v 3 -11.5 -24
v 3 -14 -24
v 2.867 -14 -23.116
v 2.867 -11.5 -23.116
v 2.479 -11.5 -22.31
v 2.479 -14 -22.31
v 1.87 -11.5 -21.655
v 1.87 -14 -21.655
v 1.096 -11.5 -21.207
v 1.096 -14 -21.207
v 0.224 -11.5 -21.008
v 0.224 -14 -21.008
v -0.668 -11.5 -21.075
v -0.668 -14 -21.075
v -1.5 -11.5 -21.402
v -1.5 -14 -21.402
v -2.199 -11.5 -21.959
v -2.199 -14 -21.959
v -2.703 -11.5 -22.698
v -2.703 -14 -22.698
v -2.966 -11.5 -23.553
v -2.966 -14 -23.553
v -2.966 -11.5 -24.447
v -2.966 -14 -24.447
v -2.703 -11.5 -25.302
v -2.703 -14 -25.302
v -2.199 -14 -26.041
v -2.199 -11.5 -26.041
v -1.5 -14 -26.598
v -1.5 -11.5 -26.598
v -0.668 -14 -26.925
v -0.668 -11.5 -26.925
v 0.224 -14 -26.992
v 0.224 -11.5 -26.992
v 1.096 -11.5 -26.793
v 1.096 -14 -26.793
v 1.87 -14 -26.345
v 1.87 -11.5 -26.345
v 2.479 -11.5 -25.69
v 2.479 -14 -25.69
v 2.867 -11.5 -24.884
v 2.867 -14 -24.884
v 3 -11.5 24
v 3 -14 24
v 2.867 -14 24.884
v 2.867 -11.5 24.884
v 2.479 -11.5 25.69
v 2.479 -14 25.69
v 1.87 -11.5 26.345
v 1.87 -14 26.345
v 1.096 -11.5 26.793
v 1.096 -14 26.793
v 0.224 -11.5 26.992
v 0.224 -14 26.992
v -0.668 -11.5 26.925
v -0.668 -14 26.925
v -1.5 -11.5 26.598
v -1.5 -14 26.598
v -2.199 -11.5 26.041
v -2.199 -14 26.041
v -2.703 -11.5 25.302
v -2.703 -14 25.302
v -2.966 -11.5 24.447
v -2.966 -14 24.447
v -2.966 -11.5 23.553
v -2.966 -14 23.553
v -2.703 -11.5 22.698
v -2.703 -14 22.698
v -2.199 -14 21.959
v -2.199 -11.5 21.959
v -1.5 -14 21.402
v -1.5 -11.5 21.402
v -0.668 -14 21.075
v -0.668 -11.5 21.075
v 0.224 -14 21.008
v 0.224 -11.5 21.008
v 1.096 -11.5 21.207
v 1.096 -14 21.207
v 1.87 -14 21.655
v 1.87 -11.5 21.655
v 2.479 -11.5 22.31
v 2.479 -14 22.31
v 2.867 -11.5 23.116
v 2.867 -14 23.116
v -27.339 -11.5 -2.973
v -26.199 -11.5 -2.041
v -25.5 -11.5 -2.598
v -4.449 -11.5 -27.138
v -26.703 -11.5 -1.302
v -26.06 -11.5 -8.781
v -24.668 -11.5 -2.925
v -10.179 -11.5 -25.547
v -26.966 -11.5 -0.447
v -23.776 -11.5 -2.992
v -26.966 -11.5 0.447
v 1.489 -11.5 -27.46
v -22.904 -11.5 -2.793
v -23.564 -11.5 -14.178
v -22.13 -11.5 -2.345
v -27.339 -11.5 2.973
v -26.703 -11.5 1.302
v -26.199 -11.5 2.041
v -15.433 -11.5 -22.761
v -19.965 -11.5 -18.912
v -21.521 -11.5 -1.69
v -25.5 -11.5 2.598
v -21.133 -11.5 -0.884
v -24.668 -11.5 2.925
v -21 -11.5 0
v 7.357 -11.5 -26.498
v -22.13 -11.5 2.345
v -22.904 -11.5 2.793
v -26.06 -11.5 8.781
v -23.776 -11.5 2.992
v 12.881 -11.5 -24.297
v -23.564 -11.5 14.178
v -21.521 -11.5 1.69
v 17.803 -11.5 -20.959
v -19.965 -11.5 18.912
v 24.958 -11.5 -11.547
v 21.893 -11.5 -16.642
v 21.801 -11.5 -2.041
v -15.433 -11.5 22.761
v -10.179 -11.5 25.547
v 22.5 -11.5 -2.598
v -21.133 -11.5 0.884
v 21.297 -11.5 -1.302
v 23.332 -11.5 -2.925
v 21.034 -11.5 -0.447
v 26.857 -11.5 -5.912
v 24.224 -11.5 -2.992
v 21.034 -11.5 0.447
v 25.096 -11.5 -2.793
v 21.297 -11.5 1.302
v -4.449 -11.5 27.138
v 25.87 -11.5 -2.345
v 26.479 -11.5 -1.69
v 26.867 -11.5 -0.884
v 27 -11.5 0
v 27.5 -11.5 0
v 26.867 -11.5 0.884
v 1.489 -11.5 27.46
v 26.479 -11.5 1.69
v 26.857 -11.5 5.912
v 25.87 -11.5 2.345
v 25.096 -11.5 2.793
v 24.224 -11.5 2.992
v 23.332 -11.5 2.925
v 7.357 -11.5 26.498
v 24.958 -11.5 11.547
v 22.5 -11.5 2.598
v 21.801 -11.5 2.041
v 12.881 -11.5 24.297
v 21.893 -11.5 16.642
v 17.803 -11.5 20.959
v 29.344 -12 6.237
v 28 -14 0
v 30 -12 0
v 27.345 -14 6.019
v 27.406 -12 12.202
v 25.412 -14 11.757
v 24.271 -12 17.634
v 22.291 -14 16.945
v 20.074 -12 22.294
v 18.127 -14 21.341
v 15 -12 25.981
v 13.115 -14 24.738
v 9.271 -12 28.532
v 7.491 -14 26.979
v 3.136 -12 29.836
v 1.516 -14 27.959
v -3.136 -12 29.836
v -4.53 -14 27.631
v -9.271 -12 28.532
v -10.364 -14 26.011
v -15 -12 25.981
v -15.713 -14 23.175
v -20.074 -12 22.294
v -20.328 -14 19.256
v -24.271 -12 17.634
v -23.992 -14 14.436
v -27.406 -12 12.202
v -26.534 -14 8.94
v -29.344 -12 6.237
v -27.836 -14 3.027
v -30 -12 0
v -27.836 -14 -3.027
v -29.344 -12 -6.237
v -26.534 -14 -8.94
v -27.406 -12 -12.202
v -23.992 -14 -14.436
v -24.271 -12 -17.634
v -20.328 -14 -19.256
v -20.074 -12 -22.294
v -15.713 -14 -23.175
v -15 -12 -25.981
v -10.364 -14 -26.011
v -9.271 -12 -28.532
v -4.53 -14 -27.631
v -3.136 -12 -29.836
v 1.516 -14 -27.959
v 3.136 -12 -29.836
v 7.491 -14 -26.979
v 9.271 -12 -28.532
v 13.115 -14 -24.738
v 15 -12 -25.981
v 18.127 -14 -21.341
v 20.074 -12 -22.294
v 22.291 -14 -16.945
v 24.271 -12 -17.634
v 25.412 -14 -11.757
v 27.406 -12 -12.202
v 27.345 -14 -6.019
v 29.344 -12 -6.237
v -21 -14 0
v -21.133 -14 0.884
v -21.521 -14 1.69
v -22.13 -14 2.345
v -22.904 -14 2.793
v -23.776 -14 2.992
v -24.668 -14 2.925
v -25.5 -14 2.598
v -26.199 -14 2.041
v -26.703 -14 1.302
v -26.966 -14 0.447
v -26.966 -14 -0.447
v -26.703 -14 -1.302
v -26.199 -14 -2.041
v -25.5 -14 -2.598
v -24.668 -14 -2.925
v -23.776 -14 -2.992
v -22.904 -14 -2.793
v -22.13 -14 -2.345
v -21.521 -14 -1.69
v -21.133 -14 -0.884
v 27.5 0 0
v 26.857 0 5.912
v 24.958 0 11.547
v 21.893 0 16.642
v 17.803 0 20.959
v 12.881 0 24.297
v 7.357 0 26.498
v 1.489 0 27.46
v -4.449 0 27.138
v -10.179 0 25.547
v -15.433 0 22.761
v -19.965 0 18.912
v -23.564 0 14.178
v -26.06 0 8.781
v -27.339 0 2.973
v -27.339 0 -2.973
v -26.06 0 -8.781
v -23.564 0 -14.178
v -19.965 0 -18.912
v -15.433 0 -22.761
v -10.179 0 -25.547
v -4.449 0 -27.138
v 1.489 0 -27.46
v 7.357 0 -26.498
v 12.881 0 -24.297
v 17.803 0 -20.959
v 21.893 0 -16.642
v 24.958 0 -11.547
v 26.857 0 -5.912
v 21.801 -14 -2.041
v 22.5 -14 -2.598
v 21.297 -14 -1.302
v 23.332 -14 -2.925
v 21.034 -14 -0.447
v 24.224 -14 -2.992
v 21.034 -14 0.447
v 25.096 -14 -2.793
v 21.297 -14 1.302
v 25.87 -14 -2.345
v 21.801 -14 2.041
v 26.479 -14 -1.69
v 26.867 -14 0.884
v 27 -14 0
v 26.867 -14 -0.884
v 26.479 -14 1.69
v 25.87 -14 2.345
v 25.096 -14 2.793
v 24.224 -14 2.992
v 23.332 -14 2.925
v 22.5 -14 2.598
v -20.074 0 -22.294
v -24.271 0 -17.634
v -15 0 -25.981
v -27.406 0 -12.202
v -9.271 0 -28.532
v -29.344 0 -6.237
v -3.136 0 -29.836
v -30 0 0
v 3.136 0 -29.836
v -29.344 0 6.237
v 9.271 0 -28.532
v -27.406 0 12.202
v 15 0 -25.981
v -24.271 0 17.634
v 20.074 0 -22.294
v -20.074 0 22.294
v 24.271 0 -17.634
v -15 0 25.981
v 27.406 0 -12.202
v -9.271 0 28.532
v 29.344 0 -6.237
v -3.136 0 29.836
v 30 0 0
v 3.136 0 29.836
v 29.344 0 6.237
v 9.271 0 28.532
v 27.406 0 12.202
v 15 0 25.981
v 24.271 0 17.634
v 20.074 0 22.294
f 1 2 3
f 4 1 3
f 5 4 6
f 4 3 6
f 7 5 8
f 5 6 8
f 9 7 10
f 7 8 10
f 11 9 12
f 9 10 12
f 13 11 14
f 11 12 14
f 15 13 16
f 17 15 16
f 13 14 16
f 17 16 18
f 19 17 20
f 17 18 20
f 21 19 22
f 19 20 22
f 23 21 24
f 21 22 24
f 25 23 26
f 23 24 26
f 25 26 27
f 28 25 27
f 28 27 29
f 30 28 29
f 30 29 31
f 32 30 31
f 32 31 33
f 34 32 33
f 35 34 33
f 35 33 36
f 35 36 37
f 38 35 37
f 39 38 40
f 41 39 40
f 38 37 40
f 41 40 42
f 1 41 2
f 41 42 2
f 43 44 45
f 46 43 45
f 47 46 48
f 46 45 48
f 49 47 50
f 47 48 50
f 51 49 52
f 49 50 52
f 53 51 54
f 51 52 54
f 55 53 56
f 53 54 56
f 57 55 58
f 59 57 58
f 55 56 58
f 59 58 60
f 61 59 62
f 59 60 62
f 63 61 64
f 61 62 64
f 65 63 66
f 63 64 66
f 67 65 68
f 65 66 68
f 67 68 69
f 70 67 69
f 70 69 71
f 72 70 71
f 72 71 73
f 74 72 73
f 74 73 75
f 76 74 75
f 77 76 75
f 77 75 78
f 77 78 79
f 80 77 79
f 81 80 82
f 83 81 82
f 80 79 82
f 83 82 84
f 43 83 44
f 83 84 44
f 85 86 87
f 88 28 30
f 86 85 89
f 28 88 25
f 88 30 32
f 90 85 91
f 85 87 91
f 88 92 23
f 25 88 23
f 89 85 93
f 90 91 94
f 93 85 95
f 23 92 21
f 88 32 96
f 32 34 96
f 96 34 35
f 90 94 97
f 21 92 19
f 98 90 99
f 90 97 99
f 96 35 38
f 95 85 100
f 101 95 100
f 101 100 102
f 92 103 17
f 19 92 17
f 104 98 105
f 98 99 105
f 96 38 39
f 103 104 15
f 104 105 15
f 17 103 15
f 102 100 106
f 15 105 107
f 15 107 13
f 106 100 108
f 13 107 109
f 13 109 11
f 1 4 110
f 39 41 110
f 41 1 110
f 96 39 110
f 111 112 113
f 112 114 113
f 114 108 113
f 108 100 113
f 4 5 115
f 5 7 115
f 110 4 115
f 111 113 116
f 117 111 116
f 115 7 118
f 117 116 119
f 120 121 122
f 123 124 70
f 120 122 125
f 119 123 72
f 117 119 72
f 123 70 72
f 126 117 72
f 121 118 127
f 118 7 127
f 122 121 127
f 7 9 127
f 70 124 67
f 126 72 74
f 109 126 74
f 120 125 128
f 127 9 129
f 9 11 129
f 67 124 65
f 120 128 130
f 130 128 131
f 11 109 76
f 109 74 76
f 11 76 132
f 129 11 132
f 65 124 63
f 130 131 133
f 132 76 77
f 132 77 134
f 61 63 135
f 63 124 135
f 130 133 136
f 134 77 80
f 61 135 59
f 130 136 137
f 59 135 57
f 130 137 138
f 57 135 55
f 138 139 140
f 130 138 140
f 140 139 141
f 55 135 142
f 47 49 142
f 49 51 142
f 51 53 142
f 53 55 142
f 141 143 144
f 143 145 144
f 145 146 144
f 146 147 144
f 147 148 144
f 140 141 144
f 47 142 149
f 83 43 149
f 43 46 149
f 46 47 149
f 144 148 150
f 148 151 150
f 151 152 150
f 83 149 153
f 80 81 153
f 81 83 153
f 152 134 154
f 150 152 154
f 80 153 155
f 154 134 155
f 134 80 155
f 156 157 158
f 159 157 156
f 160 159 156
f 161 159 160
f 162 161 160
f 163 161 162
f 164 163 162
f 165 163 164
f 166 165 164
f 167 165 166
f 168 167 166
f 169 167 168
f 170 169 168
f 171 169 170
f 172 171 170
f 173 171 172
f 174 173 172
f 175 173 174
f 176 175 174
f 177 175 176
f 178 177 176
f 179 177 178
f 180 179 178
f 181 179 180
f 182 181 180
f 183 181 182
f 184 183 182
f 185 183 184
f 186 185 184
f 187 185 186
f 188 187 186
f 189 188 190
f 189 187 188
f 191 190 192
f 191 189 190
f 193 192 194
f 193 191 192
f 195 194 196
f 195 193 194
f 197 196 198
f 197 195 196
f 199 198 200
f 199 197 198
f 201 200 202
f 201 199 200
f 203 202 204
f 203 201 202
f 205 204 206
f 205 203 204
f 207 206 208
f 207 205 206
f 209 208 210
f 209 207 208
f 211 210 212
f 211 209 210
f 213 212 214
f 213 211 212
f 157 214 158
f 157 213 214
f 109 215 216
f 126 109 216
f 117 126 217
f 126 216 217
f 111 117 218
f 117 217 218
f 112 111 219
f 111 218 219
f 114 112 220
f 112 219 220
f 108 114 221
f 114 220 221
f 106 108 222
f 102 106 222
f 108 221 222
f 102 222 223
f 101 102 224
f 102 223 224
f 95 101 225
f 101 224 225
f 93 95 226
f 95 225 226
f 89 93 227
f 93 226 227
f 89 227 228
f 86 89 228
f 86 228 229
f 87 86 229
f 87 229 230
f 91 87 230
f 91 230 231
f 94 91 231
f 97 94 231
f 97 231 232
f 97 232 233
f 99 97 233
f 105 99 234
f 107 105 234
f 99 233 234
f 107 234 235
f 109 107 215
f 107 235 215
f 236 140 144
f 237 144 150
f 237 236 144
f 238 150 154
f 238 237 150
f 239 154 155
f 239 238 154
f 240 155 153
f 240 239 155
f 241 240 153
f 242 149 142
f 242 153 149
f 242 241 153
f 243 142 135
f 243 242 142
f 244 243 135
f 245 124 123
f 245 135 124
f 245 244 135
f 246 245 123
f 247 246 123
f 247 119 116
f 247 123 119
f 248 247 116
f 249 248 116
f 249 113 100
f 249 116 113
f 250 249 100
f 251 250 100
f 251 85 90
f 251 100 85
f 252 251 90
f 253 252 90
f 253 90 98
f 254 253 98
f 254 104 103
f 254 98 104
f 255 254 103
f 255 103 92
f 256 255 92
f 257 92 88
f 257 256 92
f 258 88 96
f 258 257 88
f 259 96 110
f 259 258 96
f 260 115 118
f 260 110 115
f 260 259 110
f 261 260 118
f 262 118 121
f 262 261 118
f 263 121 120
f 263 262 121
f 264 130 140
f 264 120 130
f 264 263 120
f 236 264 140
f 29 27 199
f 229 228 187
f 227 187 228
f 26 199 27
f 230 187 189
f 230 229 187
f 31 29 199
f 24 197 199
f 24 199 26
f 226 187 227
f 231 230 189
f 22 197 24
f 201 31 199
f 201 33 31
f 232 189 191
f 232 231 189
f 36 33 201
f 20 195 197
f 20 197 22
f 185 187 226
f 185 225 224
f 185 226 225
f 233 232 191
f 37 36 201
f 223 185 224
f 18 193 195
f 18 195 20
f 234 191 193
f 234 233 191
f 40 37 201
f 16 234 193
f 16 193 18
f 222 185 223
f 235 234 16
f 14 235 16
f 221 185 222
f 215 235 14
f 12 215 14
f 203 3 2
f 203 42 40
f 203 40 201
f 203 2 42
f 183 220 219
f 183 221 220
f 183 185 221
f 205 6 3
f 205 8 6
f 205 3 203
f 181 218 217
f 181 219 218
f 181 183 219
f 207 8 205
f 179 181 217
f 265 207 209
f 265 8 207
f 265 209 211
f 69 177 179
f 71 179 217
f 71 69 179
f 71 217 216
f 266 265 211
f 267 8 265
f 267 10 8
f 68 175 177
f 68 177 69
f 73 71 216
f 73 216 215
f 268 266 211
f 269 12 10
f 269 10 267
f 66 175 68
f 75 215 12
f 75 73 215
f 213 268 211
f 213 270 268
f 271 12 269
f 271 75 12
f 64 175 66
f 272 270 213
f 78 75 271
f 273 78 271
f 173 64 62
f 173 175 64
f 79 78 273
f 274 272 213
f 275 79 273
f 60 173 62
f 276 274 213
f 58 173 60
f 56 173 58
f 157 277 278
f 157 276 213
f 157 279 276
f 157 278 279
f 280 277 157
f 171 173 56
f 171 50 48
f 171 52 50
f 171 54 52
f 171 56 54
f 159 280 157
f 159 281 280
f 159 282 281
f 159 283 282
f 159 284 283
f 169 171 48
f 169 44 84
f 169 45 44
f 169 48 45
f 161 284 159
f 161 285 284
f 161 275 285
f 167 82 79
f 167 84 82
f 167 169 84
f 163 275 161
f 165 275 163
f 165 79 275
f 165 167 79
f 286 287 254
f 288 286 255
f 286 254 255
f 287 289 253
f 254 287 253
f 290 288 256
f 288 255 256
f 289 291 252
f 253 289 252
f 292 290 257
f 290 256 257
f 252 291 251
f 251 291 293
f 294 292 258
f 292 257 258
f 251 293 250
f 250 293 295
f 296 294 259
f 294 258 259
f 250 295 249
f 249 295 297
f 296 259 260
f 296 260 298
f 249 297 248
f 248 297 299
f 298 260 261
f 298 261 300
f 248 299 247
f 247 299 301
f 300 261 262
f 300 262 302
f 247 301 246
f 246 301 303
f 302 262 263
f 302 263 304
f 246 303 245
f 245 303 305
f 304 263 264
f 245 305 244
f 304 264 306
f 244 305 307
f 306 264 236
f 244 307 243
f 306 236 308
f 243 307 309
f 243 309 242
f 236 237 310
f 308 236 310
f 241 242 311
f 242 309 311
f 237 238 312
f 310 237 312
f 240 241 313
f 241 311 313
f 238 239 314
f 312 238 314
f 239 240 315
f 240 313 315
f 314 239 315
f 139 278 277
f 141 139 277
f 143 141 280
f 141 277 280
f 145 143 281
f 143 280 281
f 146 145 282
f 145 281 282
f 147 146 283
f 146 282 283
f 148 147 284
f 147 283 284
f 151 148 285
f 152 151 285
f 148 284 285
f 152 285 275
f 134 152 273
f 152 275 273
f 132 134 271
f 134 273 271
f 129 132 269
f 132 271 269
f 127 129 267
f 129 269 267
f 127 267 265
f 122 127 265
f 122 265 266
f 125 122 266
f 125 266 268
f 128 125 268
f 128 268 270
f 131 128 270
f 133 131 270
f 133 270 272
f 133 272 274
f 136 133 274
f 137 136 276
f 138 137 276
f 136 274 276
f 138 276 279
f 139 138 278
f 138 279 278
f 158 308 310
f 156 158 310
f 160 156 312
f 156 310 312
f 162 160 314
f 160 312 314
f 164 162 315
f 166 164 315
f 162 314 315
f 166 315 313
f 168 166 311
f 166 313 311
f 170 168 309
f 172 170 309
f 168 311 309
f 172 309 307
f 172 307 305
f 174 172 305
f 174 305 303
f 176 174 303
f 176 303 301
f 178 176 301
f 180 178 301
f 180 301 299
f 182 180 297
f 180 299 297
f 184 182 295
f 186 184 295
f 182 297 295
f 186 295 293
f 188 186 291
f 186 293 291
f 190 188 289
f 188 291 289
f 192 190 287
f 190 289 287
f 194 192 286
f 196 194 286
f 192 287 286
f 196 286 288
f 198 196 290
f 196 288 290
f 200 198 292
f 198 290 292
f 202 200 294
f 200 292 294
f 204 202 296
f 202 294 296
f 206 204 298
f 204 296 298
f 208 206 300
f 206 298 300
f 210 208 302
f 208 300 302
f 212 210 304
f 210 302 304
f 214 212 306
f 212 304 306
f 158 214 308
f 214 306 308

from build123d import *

# Parameters (mm, degrees)
F0_R     = 30
F1_DEPTH = 14
F2_T     = -2.5
F3_R     = 3
F4_DEPTH = 2.5
F5_SIZE  = 2


with BuildPart() as f1:
    # F0 (on Front) → F1 (new body)
    with BuildSketch(Plane.XZ):
        Circle(F0_R)
    extrude(amount=F1_DEPTH)

    # F2
    f2_openings = [f1.faces().sort_by_distance(p)[0] for p in [
        (0, 0, 0),
    ]]
    offset(amount=F2_T, openings=f2_openings)

    # F3 (on face) → F4 (cut, through all)
    with BuildSketch(Plane.XZ.offset(14)):
        with Locations((0, -24)):
            Circle(F3_R)
        with Locations((-24, 0)):
            Circle(F3_R)
        with Locations((24, 0)):
            Circle(F3_R)
        with Locations((0, 24)):
            Circle(F3_R)
    extrude(amount=-F4_DEPTH, mode=Mode.SUBTRACT)

    # F5
    f5_edges = [f1.edges().sort_by_distance(p)[0] for p in [
        (-30, -14, 0),
    ]]
    chamfer(f5_edges, length=F5_SIZE)


solid = f1.part
